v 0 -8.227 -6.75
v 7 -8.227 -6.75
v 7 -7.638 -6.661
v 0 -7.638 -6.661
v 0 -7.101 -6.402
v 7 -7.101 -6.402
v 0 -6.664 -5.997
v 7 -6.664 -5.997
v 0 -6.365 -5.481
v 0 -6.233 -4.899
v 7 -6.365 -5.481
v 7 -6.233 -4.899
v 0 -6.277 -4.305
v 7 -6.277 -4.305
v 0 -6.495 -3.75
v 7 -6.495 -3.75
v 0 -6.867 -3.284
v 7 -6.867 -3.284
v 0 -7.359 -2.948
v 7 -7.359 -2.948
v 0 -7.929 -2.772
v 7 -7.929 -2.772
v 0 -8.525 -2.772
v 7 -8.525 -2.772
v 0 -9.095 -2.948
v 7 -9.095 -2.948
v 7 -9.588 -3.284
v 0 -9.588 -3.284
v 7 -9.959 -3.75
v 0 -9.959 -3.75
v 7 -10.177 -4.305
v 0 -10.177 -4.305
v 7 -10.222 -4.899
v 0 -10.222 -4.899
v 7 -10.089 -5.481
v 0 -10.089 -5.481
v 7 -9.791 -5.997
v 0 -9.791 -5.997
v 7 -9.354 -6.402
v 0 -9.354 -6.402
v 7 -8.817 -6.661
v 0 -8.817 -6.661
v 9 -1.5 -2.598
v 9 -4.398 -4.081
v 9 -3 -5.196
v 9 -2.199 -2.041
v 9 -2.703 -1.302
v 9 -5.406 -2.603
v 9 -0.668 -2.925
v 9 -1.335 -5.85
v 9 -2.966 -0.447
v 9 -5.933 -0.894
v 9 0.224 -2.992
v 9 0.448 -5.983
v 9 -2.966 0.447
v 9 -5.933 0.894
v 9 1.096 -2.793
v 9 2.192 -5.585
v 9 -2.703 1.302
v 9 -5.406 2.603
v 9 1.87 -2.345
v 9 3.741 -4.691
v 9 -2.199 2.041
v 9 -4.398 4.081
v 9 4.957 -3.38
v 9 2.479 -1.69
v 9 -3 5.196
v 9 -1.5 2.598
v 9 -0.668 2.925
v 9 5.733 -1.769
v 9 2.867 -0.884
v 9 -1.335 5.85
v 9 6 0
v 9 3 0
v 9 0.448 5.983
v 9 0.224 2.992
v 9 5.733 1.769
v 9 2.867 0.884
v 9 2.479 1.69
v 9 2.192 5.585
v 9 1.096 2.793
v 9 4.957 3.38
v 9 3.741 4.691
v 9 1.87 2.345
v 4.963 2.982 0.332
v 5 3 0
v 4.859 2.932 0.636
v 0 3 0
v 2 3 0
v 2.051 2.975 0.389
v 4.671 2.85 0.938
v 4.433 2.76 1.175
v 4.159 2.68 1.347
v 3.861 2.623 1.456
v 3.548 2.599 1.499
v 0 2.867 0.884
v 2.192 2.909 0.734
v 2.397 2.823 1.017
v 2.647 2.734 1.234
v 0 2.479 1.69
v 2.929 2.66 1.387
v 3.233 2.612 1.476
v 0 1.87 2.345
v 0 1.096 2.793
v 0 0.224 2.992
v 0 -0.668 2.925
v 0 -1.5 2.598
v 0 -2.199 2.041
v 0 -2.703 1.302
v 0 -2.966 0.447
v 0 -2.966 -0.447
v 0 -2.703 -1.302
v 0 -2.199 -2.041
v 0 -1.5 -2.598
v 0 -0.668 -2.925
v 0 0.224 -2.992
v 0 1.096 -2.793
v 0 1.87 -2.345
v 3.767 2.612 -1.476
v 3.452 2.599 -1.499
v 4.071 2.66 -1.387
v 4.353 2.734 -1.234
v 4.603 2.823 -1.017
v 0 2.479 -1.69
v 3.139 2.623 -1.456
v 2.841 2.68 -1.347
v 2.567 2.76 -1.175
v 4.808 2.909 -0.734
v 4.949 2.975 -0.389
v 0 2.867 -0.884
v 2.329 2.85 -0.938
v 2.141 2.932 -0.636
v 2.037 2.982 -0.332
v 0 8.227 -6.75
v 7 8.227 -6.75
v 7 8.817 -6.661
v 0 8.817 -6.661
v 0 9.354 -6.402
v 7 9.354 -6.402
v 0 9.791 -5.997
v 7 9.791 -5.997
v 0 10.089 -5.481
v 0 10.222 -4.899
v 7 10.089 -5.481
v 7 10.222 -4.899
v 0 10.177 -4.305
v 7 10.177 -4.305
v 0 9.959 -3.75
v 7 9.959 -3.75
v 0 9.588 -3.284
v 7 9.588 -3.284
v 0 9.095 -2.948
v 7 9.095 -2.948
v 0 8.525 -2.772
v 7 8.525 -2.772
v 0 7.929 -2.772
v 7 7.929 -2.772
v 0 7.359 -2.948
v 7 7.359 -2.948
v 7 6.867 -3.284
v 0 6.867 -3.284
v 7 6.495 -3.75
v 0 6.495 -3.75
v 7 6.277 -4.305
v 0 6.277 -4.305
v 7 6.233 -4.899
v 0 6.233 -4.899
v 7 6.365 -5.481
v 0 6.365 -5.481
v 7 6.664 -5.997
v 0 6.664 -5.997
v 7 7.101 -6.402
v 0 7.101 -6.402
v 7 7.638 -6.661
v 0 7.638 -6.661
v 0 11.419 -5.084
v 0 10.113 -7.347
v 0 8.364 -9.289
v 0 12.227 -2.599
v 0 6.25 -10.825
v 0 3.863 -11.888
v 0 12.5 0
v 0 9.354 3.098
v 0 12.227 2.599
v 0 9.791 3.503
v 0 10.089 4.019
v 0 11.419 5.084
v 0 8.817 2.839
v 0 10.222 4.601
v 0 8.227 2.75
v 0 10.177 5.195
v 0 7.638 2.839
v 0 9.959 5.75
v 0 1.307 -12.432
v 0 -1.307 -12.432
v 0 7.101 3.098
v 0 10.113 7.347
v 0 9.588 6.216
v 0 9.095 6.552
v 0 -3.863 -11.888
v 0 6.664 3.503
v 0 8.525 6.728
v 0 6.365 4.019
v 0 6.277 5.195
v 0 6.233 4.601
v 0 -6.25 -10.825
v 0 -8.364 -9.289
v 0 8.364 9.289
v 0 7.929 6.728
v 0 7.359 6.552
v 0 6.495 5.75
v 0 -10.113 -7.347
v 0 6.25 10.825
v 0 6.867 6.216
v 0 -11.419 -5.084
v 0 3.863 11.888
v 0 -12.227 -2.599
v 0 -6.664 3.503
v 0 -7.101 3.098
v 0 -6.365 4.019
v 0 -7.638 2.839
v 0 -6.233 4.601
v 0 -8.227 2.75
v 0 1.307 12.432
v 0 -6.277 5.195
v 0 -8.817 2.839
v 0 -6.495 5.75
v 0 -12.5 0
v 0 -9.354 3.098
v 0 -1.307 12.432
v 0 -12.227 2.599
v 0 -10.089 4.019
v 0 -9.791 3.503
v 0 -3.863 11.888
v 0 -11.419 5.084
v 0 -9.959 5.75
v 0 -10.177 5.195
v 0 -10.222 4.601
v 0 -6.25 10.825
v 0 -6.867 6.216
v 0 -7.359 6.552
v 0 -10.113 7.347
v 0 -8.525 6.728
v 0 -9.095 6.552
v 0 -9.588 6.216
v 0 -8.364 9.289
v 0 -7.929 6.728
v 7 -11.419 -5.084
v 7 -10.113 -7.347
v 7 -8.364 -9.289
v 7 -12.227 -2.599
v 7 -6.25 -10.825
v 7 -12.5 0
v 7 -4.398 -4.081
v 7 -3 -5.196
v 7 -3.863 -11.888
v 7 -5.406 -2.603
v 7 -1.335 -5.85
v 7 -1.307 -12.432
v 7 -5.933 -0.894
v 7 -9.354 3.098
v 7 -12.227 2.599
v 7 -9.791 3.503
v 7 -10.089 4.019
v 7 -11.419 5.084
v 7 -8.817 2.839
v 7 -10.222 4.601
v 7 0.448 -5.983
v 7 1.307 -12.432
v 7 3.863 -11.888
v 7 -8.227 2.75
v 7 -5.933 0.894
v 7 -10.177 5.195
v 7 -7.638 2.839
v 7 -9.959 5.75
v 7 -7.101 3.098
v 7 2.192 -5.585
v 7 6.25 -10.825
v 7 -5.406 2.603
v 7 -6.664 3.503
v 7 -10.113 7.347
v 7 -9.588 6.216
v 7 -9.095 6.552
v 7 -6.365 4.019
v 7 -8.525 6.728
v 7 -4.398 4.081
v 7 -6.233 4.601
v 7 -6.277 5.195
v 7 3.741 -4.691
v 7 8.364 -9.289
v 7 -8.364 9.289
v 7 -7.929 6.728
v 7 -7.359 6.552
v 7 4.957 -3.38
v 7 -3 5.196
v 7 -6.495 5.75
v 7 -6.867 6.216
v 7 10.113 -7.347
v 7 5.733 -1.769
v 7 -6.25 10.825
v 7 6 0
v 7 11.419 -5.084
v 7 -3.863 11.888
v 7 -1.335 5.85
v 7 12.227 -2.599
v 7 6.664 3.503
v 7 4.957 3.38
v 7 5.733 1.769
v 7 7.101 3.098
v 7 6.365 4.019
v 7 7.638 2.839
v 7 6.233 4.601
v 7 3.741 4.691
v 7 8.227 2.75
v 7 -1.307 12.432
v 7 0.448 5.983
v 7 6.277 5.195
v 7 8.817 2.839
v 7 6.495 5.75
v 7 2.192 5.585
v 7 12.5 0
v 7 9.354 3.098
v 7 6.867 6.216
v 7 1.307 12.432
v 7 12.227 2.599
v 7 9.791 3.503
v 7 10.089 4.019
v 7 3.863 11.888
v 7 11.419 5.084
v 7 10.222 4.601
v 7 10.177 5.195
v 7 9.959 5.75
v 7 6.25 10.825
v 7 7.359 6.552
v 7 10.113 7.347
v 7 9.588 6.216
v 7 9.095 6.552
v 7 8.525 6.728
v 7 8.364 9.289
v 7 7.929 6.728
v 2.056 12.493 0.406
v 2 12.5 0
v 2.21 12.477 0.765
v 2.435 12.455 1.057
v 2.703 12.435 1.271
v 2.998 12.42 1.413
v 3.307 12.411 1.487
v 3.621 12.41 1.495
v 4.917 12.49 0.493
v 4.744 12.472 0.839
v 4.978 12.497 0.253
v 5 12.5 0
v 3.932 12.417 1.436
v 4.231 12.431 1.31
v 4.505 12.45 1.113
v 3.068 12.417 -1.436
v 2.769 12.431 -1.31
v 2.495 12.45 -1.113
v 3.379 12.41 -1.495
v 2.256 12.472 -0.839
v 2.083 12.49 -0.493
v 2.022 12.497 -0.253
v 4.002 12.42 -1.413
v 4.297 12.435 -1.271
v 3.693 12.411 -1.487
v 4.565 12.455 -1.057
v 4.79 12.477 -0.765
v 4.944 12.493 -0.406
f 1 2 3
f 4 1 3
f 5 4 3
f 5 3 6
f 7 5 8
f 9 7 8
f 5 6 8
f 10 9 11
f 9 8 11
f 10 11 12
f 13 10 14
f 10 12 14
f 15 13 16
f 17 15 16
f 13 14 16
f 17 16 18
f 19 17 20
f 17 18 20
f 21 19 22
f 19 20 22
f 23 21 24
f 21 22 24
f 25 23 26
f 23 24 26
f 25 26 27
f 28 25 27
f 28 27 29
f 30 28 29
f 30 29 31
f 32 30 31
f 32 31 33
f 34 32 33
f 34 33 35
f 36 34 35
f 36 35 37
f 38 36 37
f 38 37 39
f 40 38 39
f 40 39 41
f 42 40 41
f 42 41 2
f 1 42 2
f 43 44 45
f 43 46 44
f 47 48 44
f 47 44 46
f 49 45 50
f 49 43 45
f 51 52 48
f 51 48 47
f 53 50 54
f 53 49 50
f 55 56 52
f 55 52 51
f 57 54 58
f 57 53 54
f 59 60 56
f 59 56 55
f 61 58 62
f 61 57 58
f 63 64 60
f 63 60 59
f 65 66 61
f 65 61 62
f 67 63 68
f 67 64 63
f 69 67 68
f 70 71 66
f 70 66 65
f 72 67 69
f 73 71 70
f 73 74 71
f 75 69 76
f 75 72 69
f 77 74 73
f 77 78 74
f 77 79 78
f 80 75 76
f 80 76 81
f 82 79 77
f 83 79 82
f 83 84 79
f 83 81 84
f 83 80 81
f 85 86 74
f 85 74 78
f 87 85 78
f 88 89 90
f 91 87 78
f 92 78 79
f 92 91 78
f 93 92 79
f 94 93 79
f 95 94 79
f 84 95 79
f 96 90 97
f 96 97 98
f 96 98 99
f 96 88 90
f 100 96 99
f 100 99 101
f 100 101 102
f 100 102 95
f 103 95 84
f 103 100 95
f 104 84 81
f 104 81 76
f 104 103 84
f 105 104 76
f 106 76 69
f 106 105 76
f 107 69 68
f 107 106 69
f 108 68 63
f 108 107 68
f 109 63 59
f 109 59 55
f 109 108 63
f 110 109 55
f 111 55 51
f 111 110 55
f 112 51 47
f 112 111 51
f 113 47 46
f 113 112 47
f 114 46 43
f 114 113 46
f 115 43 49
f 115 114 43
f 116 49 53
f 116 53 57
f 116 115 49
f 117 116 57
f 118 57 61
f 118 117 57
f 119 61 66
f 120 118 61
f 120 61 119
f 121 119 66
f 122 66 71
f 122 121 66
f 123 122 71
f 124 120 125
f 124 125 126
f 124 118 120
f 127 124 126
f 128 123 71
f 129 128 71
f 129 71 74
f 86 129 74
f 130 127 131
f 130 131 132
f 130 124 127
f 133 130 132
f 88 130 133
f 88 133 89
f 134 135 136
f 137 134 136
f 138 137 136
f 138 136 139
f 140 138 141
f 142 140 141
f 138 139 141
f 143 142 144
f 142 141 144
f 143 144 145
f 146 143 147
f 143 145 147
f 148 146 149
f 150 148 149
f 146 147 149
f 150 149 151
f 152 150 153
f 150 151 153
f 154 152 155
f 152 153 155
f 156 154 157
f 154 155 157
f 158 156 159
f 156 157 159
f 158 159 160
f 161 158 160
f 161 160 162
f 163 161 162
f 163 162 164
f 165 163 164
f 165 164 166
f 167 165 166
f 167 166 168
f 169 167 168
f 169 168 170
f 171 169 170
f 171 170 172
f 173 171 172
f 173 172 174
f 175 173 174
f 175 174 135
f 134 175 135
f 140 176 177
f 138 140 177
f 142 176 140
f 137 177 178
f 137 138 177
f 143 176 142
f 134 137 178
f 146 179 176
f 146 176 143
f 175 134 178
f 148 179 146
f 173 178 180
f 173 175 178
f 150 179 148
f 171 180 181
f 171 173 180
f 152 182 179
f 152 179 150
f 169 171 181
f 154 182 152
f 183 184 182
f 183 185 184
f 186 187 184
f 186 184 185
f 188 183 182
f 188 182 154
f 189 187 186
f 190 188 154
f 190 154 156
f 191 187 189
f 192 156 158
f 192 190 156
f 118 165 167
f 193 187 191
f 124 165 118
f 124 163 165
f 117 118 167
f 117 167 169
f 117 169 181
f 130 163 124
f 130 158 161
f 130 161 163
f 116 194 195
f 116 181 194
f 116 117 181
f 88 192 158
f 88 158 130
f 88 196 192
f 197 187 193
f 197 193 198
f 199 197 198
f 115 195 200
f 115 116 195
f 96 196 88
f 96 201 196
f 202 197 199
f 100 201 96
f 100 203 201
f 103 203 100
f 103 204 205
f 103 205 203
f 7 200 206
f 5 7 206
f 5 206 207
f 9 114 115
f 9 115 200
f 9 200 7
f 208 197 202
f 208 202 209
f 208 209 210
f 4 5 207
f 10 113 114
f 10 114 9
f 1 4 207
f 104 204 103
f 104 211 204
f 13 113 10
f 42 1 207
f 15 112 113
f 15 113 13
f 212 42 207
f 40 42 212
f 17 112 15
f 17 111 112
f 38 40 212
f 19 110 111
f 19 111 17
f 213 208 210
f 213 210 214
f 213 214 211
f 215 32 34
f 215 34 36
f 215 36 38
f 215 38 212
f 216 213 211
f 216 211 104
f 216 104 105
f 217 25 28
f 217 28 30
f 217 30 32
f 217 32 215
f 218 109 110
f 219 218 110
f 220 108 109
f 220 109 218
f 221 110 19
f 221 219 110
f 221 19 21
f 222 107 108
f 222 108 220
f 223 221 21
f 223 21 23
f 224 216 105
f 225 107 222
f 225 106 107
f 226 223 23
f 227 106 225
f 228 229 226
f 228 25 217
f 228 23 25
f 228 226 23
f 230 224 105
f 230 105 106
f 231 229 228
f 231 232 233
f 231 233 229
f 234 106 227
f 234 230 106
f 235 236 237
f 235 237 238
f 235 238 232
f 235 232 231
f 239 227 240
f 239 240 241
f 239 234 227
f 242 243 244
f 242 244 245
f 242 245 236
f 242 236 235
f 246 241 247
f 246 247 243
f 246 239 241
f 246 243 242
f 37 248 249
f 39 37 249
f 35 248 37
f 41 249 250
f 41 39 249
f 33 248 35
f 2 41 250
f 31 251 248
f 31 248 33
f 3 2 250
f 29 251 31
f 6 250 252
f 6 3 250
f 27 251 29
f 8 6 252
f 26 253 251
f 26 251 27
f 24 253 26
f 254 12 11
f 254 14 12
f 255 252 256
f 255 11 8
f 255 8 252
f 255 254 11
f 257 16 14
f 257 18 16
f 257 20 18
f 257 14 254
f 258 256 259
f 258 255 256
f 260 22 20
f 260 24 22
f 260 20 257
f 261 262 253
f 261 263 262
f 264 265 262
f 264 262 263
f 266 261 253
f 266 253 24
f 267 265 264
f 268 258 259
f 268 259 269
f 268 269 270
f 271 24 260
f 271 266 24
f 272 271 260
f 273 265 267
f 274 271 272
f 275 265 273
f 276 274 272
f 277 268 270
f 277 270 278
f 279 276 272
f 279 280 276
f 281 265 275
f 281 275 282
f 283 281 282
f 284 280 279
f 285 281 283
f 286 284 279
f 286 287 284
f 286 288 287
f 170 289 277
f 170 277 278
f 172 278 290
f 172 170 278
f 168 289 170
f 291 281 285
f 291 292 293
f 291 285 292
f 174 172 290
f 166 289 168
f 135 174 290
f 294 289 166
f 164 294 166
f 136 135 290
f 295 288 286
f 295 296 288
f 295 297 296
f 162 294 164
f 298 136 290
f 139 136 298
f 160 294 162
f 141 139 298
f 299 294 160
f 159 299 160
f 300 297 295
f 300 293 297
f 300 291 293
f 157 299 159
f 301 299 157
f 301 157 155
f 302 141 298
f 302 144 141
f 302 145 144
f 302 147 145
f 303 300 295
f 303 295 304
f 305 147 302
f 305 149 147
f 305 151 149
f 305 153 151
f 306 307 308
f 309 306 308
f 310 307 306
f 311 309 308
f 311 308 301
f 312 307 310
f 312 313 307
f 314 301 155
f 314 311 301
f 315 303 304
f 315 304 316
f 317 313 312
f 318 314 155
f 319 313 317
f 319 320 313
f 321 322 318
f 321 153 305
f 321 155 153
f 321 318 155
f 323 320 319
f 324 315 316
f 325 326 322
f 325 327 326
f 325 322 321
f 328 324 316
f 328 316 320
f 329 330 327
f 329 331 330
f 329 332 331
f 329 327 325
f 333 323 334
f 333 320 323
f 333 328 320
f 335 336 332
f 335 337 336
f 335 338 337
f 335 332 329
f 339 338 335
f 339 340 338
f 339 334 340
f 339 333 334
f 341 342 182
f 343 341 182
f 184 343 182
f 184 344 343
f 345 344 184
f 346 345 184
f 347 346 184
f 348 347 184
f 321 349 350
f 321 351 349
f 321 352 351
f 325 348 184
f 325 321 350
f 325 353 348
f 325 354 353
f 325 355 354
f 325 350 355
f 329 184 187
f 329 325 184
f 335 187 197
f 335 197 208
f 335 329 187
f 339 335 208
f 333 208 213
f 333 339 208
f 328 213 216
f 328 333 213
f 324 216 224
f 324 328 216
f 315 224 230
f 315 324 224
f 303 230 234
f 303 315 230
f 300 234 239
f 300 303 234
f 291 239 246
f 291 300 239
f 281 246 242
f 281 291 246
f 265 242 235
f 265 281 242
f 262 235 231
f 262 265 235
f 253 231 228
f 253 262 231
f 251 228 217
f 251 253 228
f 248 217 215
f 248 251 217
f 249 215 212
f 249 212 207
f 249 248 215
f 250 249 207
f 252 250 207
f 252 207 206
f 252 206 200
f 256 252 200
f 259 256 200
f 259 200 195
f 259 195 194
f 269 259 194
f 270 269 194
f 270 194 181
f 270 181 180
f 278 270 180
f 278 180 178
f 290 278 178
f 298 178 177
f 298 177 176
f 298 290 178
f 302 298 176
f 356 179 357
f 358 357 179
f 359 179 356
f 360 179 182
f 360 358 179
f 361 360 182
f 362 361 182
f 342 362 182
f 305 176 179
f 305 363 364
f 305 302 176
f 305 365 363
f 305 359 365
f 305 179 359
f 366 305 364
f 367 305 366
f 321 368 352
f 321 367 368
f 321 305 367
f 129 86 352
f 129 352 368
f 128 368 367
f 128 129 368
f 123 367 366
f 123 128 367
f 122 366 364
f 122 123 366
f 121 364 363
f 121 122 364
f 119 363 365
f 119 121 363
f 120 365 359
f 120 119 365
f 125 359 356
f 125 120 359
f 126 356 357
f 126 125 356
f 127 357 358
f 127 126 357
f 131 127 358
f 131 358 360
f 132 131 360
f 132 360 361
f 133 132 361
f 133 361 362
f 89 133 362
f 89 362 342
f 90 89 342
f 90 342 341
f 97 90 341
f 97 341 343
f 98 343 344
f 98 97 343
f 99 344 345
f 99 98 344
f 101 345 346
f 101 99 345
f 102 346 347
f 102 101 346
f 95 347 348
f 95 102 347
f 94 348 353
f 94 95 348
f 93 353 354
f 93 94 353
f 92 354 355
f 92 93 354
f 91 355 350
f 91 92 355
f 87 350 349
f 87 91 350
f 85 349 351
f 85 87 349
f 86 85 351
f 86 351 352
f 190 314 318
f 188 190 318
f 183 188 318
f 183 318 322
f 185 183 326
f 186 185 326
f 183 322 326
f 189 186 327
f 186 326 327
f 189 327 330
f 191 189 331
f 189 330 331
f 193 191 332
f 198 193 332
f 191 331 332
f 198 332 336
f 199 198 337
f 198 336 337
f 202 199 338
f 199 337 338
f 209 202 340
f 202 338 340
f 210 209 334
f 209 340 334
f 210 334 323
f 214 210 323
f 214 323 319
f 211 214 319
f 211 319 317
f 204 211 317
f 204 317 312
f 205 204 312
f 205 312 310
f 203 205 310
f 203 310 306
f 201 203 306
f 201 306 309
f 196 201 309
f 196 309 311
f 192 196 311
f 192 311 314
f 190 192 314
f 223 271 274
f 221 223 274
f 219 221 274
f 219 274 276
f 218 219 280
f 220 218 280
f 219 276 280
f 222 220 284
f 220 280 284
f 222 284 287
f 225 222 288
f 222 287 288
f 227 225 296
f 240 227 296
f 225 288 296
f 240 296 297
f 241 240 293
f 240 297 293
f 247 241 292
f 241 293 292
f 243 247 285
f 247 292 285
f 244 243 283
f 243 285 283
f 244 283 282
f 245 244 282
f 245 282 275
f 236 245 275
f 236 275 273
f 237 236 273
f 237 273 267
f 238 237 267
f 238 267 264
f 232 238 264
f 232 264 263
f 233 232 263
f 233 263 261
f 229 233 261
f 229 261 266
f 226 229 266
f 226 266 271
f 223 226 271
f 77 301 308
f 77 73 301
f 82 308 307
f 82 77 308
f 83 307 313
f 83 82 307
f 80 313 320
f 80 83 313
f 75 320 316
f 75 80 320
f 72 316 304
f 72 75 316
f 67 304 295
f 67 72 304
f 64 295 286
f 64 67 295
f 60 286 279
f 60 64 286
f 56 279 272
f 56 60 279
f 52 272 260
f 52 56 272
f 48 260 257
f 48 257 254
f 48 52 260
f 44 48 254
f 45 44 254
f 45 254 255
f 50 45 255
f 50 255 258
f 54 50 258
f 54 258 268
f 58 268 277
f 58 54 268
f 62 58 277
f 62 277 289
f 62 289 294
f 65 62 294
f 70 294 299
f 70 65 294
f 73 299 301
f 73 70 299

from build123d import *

# Parameters (mm, degrees)
ESQUISSE2_R             = 2
ENL_V_MAT_EXTRU_1_DEPTH = 8
ESQUISSE3_R             = 1.5
ENL_V_MAT_EXTRU_2_DEPTH = 30


with BuildPart() as part:
    # Esquisse1 → Révolution1 (revolve)
    with BuildSketch(Plane.XY):
        Polygon((0, 3), (0, 12.5), (7, 12.5), (7, 6), (9, 6), (9, 3), align=None)
    revolve(axis=Axis((0, 0, 0), (1, 0, 0)))

    # Esquisse2 → Enlèv. mat.-Extru.1 (cut, through all)
    with BuildSketch(Plane(origin=(7, 0, 0), x_dir=(0, 0, -1), z_dir=(1, 0, 0))):
        with Locations((-4.75, 8.227241336)):
            Circle(ESQUISSE2_R)
        with Locations((4.75, 8.227241336)):
            Circle(ESQUISSE2_R)
        with Locations((-4.75, -8.227241336)):
            Circle(ESQUISSE2_R)
        with Locations((4.75, -8.227241336)):
            Circle(ESQUISSE2_R)
    extrude(amount=-ENL_V_MAT_EXTRU_1_DEPTH, mode=Mode.SUBTRACT)

    # Esquisse3 → Enlèv. mat.-Extru.2 (cut)
    with BuildSketch(Plane(origin=(0, 0, 0), x_dir=(1, 0, 0), z_dir=(0, 1, 0))):
        with Locations((3.5, 0)):
            Circle(ESQUISSE3_R)
    extrude(amount=ENL_V_MAT_EXTRU_2_DEPTH, mode=Mode.SUBTRACT)


solid = part.part
